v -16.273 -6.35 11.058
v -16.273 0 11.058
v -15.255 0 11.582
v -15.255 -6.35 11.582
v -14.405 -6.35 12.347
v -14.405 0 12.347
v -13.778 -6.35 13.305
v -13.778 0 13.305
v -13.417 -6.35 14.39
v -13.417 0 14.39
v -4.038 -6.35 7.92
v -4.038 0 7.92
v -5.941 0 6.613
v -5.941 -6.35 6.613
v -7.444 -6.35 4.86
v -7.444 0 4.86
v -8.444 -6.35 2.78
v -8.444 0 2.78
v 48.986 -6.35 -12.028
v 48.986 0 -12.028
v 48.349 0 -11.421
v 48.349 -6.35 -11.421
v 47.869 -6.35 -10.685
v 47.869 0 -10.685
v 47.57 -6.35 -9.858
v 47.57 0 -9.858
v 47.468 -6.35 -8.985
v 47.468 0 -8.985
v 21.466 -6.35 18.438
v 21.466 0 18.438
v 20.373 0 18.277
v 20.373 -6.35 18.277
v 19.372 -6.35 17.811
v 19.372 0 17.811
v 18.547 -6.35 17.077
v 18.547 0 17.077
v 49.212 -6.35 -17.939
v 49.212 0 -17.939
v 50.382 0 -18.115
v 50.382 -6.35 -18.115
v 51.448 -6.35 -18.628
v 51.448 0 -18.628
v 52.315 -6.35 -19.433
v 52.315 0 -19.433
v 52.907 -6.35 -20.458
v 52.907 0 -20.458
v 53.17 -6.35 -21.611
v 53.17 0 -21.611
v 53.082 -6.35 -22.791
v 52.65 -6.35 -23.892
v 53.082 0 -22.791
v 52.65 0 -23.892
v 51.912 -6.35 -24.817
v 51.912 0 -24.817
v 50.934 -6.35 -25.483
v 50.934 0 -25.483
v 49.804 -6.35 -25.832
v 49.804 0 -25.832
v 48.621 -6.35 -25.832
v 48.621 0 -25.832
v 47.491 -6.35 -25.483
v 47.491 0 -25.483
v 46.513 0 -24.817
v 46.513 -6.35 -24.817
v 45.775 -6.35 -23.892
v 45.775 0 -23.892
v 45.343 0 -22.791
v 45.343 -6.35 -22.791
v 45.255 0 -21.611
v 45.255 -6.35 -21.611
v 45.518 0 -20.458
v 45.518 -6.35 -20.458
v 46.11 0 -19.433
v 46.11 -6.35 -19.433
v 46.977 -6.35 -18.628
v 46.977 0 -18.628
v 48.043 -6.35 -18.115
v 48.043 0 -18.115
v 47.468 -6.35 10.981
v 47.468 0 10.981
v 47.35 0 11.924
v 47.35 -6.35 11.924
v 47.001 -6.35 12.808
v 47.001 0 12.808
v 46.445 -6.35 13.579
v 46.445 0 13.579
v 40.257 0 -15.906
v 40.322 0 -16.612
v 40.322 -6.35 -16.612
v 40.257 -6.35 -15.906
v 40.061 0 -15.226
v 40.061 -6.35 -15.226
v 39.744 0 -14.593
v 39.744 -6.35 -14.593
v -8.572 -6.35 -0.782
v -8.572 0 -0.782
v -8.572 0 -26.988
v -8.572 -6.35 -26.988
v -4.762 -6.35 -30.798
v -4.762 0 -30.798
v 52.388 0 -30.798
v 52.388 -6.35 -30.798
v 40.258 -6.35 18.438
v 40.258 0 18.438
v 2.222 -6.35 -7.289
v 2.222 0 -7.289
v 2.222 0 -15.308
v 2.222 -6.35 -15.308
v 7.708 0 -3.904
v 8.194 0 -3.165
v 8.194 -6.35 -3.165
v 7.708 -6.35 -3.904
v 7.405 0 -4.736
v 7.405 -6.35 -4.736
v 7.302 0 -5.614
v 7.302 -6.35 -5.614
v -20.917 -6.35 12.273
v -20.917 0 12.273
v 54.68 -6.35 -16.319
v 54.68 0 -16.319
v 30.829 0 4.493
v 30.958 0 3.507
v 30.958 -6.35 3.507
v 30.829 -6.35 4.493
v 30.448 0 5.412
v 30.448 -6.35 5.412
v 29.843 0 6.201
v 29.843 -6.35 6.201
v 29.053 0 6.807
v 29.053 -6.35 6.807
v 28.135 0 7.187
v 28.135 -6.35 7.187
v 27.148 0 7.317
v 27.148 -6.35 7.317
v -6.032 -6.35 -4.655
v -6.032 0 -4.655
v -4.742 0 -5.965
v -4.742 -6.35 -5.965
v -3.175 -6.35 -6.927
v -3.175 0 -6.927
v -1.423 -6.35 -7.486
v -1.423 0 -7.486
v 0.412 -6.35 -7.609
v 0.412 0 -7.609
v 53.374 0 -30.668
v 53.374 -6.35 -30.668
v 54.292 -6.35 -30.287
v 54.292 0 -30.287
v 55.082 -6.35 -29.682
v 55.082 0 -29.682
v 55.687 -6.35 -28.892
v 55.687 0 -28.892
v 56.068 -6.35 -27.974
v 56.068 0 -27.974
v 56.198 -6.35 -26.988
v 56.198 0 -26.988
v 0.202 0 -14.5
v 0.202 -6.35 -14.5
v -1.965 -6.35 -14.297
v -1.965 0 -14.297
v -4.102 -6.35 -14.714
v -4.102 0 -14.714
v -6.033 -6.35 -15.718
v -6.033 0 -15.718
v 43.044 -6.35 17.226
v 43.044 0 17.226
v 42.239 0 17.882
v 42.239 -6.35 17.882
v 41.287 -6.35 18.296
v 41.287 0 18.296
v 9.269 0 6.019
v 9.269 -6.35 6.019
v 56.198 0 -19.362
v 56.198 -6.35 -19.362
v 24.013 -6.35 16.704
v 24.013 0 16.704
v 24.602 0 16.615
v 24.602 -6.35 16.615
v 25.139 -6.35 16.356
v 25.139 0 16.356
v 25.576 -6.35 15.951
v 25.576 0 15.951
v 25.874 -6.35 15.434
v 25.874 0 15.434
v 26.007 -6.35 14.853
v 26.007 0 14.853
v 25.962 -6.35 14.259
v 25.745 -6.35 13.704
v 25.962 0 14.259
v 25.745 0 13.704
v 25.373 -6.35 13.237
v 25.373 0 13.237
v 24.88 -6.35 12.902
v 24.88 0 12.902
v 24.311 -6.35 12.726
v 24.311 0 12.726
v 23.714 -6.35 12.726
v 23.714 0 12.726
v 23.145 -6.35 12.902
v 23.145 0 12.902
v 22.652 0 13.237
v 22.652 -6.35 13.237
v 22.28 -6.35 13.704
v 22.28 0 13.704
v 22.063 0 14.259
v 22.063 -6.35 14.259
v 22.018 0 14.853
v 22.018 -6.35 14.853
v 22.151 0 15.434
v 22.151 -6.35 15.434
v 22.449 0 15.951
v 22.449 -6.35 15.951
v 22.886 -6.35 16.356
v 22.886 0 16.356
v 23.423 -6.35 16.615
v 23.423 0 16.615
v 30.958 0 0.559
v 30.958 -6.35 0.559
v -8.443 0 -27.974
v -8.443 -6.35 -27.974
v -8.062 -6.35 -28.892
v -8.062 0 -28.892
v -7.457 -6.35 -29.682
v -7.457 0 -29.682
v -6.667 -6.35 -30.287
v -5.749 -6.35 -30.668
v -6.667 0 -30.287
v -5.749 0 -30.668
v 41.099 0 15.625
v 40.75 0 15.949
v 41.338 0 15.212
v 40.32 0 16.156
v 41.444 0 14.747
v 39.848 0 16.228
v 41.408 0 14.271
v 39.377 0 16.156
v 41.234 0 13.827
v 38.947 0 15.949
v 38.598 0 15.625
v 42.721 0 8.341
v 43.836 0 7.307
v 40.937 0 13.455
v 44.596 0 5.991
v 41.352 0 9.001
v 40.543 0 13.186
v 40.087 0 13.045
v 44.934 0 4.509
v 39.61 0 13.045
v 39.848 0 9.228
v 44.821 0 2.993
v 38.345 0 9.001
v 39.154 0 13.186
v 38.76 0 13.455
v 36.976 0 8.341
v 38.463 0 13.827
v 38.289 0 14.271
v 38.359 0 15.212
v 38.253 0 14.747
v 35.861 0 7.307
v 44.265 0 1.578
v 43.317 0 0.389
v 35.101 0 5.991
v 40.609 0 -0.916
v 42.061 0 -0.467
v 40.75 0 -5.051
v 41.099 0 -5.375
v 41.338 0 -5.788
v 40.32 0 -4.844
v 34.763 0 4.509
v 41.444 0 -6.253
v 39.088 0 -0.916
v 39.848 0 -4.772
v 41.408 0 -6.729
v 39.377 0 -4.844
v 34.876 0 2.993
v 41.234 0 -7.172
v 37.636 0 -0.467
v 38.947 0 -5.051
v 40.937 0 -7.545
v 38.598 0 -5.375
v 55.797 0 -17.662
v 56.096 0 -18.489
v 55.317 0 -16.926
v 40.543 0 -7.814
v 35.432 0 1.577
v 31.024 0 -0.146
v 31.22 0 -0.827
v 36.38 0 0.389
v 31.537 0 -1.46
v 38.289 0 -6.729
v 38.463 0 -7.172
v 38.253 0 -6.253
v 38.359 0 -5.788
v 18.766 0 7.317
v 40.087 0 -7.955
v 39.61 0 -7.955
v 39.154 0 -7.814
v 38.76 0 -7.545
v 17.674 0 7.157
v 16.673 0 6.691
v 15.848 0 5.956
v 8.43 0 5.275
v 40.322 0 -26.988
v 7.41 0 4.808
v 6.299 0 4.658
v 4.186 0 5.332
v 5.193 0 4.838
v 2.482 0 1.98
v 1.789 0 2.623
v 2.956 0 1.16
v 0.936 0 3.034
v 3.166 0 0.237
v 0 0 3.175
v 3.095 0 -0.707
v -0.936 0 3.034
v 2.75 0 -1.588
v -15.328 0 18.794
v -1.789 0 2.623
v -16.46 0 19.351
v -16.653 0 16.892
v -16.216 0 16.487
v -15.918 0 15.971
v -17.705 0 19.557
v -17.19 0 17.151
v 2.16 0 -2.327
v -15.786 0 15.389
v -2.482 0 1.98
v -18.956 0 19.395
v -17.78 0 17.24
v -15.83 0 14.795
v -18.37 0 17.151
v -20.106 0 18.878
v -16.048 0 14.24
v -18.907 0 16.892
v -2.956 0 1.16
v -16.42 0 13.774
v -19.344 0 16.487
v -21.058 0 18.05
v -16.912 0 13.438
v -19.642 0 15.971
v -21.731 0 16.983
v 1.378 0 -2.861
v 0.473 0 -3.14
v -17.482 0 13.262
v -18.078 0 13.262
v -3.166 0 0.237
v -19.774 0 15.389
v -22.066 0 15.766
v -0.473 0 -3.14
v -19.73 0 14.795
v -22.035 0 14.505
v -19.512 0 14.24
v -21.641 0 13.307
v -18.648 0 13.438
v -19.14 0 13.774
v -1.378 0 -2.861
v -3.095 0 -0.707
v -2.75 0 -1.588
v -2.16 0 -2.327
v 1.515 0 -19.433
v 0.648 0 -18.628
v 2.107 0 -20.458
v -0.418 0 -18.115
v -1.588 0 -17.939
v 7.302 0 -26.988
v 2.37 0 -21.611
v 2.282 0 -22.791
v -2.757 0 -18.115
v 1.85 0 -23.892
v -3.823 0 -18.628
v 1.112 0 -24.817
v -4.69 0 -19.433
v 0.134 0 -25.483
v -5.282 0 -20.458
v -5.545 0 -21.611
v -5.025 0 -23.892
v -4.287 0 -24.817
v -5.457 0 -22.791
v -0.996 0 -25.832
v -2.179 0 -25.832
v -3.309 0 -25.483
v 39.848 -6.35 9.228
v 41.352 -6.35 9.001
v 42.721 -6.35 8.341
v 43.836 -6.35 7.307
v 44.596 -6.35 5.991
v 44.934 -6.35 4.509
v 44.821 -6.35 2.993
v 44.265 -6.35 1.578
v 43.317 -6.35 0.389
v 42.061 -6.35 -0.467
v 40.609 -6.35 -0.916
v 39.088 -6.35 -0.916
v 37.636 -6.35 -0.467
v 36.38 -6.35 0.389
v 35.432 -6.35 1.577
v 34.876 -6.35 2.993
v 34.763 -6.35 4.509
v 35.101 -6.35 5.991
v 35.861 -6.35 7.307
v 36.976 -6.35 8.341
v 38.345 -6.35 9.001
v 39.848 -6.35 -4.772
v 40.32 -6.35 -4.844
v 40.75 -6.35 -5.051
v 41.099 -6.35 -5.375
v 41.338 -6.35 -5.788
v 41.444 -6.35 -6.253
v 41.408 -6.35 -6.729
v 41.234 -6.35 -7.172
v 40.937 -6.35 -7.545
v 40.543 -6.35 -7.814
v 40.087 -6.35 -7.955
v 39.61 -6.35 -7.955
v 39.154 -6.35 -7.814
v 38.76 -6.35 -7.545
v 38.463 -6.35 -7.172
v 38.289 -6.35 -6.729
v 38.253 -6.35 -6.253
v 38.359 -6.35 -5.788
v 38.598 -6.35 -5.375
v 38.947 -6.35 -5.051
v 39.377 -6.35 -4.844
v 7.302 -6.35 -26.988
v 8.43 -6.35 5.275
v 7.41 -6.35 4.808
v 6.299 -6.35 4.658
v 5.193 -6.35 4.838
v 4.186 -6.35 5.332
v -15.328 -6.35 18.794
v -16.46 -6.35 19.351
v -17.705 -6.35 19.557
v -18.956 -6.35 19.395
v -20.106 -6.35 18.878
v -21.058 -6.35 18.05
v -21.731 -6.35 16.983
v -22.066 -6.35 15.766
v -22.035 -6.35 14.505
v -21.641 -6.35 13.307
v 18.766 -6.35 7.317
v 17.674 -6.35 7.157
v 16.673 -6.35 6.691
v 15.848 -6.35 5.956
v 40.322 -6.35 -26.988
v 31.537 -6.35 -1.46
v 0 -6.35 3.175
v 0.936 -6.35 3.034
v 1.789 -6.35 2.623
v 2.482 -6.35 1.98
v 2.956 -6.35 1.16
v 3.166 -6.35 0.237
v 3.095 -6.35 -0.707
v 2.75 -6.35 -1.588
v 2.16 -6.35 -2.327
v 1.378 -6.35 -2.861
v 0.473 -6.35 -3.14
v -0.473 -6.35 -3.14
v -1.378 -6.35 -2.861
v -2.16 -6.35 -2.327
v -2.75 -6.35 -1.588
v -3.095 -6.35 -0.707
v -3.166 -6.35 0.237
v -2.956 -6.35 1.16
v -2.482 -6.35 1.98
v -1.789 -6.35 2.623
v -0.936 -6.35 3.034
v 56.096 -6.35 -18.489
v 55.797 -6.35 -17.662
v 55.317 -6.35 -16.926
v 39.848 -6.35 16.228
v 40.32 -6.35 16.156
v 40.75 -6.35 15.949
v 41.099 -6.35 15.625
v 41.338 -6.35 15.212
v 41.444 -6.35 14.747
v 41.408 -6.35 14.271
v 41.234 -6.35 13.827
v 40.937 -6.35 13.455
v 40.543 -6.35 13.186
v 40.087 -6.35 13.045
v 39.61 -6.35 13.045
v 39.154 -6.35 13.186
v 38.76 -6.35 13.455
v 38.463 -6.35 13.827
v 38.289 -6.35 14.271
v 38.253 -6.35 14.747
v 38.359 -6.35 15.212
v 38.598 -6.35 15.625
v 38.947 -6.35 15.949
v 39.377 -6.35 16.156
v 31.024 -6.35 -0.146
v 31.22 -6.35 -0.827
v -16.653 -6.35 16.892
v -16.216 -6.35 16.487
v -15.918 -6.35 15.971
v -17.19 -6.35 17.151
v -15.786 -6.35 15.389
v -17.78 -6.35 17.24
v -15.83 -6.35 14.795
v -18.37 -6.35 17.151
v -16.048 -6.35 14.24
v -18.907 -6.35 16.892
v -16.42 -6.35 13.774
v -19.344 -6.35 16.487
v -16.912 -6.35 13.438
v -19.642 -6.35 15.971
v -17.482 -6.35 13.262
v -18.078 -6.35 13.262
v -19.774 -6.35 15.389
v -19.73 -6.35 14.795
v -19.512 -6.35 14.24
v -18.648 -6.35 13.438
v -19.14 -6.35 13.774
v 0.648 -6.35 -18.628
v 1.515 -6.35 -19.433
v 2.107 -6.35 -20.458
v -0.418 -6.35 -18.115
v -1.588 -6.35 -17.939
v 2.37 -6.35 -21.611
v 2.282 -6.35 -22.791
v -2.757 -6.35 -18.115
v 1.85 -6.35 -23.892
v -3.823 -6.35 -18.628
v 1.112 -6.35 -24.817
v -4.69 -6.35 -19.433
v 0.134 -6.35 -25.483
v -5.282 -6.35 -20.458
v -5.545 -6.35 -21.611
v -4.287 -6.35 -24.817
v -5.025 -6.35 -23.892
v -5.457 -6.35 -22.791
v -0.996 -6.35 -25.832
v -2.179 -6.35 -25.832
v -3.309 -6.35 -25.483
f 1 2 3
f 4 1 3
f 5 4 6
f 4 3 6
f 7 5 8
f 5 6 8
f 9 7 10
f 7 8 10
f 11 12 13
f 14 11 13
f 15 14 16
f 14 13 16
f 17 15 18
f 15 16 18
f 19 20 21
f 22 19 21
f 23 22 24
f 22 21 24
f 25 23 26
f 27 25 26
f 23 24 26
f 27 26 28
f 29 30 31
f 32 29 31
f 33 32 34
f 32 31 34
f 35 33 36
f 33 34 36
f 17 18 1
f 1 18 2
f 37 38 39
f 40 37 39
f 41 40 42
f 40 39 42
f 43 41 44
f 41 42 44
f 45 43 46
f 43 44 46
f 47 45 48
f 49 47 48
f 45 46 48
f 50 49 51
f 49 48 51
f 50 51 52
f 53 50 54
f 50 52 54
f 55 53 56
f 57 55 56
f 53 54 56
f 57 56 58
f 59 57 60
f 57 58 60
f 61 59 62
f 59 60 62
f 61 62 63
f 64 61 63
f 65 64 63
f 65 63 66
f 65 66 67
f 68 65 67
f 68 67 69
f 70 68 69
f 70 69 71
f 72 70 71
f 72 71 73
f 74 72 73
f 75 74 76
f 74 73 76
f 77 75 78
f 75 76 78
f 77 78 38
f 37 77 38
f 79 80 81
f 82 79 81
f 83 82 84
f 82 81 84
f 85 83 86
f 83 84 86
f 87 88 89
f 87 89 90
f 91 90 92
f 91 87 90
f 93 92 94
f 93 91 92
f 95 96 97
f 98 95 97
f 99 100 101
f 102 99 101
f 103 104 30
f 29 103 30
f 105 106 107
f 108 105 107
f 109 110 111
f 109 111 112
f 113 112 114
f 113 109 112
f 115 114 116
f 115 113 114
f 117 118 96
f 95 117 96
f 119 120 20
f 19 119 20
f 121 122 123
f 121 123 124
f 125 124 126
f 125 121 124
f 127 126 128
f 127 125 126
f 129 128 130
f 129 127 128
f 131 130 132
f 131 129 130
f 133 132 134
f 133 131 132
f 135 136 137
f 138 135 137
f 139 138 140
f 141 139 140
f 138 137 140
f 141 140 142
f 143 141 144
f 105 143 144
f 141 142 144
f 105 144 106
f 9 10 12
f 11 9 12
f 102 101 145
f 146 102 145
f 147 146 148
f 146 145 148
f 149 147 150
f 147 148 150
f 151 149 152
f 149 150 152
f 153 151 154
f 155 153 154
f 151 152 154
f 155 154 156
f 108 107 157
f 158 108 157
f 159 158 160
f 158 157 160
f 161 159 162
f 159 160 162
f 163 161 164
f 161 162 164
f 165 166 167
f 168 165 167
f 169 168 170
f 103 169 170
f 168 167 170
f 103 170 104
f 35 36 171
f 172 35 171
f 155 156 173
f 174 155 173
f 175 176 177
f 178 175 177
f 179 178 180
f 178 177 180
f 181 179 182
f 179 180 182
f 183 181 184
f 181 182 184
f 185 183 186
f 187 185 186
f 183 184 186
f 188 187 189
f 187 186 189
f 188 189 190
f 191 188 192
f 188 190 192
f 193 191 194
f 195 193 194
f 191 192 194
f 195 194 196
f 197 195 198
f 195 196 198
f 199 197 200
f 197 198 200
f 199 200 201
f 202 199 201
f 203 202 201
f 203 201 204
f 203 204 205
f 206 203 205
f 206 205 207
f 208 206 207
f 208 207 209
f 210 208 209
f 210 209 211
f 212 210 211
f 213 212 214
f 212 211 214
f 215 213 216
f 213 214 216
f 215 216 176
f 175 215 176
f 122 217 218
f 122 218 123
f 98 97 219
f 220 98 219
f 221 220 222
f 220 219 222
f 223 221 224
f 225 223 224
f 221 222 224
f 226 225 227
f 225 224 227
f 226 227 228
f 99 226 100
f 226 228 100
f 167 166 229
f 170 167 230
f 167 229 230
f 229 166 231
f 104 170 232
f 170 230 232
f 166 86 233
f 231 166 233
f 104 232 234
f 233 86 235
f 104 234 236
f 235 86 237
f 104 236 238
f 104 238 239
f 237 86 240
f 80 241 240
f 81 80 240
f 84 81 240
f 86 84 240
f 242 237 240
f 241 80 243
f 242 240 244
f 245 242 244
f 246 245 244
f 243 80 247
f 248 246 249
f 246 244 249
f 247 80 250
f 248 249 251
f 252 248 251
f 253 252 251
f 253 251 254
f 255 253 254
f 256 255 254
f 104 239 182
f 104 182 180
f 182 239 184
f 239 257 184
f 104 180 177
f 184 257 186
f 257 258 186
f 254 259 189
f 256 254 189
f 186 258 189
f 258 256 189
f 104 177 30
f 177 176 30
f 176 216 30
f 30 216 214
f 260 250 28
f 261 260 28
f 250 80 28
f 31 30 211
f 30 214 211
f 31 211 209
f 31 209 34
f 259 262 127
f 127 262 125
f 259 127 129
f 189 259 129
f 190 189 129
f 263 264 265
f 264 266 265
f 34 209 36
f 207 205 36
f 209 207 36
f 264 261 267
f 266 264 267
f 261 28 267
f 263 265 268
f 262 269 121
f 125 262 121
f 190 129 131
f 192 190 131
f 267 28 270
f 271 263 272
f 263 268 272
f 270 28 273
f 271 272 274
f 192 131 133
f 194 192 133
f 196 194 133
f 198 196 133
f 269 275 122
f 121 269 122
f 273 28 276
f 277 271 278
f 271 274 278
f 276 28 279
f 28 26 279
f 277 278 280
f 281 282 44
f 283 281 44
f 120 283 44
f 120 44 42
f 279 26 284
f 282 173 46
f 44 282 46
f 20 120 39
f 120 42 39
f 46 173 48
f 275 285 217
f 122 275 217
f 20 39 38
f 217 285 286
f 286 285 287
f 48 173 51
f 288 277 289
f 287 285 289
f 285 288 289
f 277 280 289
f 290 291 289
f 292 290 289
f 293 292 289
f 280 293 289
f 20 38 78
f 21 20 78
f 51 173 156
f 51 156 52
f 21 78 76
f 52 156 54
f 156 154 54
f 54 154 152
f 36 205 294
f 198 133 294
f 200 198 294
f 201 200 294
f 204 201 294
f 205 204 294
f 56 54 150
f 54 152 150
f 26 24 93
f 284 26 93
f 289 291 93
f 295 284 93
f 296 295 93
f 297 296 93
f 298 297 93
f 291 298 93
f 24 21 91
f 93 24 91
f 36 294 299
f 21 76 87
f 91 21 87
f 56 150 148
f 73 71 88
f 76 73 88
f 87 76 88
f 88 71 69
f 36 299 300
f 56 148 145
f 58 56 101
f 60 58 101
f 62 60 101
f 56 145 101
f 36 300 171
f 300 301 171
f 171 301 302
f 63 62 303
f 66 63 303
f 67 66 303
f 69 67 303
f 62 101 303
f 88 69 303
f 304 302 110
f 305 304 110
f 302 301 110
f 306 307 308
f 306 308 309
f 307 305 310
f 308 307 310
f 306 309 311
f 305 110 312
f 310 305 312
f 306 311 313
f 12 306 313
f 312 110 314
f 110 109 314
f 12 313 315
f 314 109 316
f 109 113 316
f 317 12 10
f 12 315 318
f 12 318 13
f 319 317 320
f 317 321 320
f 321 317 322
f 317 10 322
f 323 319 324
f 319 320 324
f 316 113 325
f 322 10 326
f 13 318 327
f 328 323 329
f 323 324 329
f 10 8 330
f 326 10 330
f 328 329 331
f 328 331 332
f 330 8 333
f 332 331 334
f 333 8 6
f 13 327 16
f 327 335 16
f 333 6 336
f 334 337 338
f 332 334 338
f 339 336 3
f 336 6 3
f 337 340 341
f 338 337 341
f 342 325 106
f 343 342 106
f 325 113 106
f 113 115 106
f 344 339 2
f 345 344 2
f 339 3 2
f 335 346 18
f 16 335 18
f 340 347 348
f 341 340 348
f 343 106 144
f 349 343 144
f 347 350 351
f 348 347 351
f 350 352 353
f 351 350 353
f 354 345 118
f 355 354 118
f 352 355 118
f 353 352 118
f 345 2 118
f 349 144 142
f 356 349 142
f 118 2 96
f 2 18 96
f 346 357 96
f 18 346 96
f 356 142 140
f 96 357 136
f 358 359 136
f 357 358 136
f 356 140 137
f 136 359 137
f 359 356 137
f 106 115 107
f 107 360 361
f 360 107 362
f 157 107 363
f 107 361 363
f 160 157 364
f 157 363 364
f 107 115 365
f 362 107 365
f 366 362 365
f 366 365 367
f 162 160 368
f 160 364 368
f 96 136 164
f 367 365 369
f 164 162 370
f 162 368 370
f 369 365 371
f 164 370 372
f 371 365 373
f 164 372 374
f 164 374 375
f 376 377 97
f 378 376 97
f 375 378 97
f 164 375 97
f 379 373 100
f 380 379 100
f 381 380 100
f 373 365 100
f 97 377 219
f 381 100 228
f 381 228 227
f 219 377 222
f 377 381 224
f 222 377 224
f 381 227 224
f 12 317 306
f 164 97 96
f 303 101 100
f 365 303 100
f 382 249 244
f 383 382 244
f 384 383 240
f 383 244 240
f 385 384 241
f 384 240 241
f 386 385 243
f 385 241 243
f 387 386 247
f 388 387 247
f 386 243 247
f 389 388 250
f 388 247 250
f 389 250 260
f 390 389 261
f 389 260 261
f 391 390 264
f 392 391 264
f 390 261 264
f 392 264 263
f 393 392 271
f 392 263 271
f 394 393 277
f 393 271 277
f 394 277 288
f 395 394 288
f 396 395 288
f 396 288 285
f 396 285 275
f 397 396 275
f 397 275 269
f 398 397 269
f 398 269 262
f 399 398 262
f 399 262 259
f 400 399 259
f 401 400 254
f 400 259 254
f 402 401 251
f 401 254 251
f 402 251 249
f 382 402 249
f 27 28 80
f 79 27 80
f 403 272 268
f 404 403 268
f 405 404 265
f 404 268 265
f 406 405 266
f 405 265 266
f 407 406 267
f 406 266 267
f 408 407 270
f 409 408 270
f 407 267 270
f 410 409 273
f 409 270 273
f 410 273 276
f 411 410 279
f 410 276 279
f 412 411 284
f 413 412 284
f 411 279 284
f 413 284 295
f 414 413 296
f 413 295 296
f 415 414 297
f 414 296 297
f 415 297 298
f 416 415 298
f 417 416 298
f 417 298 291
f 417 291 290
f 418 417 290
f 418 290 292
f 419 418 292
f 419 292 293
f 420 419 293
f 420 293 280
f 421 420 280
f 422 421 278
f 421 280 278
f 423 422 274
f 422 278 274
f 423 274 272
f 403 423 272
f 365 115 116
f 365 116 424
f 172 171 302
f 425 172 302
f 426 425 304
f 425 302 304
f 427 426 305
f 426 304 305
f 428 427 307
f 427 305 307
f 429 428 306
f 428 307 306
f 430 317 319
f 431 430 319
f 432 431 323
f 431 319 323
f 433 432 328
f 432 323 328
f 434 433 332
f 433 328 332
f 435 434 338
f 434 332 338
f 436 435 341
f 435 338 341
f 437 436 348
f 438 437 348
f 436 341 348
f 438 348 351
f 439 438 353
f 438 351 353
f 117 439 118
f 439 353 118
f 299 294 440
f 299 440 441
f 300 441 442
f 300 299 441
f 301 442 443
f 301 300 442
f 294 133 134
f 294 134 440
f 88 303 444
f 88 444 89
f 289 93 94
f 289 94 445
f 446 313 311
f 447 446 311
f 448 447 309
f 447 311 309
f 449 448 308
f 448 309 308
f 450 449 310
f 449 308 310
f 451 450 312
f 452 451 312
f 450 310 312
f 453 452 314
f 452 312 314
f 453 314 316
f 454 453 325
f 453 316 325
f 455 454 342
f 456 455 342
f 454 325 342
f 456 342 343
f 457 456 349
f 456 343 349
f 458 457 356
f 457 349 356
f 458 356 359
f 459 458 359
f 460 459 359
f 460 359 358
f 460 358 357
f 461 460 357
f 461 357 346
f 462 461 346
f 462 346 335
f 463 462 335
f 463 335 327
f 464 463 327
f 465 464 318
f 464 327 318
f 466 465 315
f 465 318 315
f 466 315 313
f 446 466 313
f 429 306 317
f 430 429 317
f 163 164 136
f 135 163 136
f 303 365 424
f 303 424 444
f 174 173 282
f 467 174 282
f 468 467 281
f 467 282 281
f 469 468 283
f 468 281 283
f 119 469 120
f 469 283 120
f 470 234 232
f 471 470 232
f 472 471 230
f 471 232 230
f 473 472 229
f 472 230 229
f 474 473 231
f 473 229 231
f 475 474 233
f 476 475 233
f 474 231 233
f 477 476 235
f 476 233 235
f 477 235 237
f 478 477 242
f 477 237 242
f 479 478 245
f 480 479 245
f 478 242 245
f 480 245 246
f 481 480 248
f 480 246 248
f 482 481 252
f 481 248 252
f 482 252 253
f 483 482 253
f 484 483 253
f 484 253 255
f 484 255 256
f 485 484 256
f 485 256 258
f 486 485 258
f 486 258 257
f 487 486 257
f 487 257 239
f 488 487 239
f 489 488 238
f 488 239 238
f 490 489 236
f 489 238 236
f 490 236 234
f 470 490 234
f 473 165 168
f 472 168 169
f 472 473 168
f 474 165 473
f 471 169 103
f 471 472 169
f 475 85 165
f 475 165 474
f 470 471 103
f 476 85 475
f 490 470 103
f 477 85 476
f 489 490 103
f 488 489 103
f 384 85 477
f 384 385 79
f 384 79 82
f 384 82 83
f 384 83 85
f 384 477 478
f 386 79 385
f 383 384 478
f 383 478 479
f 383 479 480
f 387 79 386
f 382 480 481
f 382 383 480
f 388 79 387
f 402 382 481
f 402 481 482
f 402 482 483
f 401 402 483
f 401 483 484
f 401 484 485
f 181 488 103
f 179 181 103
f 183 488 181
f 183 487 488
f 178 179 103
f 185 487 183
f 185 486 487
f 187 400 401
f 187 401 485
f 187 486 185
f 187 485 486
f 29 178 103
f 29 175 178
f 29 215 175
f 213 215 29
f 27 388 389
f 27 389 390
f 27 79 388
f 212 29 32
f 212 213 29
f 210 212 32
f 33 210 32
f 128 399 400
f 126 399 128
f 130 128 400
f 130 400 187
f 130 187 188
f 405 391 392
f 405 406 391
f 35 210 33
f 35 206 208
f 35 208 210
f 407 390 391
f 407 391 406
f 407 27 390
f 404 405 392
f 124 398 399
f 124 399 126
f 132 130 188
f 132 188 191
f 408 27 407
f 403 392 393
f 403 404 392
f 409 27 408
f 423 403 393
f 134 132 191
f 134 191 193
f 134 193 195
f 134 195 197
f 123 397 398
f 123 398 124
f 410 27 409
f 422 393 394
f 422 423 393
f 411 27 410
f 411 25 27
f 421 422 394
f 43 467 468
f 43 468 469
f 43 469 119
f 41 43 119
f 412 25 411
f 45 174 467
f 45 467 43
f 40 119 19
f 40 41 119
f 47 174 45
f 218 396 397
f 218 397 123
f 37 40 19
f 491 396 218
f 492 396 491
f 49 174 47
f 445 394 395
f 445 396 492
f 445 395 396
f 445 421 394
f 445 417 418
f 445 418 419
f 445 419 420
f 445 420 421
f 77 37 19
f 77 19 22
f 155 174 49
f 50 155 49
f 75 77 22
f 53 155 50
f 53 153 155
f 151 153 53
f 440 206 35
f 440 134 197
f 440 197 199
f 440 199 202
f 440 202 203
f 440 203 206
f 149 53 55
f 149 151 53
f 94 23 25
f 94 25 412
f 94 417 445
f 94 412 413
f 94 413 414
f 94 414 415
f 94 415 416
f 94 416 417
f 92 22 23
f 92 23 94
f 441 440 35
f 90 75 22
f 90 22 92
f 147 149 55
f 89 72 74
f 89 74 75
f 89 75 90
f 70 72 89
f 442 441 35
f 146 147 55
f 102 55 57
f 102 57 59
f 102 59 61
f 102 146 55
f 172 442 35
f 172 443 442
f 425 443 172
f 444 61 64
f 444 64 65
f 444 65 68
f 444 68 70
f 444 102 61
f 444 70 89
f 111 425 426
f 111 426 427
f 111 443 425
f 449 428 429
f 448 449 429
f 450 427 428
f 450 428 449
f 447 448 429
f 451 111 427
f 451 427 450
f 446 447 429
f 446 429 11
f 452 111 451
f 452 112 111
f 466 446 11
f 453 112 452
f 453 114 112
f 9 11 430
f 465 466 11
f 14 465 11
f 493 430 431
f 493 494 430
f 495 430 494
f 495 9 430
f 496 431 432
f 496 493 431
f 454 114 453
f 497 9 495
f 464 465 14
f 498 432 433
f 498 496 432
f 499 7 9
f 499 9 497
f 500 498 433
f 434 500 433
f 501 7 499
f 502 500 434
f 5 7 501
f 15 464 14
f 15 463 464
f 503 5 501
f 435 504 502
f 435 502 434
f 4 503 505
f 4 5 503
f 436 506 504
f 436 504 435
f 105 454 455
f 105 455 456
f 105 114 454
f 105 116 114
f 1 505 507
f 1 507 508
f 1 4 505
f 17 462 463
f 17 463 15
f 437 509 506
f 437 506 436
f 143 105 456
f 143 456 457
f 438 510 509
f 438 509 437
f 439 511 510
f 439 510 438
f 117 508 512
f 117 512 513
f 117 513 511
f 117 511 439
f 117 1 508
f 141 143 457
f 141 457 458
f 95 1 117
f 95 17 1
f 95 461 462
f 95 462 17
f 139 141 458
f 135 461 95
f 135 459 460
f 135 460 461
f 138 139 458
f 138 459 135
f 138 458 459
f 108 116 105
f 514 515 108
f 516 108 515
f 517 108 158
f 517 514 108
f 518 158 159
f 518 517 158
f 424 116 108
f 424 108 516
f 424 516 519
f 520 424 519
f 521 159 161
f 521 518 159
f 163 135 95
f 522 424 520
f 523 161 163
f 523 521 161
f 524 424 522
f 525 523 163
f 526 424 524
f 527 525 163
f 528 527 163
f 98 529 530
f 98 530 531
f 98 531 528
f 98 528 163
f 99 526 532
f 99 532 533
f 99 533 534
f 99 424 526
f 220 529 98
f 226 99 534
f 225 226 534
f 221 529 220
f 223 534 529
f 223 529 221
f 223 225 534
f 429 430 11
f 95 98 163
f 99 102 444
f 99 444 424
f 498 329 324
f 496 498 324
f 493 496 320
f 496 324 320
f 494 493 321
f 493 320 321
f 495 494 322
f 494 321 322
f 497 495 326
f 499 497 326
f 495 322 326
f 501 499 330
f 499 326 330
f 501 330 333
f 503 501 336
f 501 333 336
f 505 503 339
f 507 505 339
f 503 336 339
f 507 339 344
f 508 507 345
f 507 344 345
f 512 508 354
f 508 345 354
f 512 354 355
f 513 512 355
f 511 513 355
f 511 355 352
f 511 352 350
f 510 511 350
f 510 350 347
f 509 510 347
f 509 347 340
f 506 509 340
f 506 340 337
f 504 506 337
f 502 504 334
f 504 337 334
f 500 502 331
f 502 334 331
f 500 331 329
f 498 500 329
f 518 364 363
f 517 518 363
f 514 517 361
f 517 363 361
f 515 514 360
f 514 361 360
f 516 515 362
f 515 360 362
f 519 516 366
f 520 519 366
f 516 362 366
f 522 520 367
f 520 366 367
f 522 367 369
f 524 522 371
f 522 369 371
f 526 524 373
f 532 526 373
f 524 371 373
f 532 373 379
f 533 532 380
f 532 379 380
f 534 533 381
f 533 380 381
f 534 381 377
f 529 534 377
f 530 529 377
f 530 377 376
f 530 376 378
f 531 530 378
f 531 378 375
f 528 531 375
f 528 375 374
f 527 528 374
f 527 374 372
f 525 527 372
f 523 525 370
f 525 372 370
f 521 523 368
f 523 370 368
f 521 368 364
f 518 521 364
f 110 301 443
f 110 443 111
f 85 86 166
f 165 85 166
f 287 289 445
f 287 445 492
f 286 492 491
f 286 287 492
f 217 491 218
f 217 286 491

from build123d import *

# Parameters (mm, degrees)
SKETCH4_R           = 3.175
SKETCH4_R_2         = 3.96875
SKETCH4_R_3         = 5.1
SKETCH4_R_4         = 1.6
SKETCH4_R_5         = 2
BOSS_EXTRUDE2_DEPTH = 6.35


with BuildPart() as part:
    # Sketch4 → Boss-Extrude2 (new body)
    with BuildSketch(Plane(origin=(0, 0, 0), x_dir=(1, 0, 0), z_dir=(0, 1, 0))):
        with BuildLine():
            Line((40.257702493, -18.4375), (21.46596982, -18.4375))
            ThreePointArc((21.46596982, -18.4375), (19.855794242, -18.080532669), (18.547340491, -17.076520793))
            Line((18.547340491, -17.076520793), (9.268629328, -6.01858343))
            ThreePointArc((9.268629328, -6.01858343), (6.86044471, -4.691952465), (4.186444468, -5.331503545))
            Line((4.186444468, -5.331503545), (-15.327970397, -18.794247435))
            ThreePointArc((-15.327970397, -18.794247435), (-21.058470009, -18.050117151), (-20.917416467, -12.27322702))
            Line((-20.917416467, -12.27322702), (-8.5725, 0.781747009))
            Line((-8.5725, 0.781747009), (-8.5725, 26.9875))
            ThreePointArc((-8.5725, 26.9875), (-7.456576836, 29.681576836), (-4.7625, 30.7975))
            Line((-4.7625, 30.7975), (52.3875, 30.7975))
            ThreePointArc((52.3875, 30.7975), (55.081576836, 29.681576836), (56.1975, 26.9875))
            Line((56.1975, 26.9875), (56.1975, 19.362095927))
            ThreePointArc((56.1975, 19.362095927), (55.797199918, 17.662082259), (54.680415238, 16.319294633))
            Line((54.680415238, 16.319294633), (48.985566477, 12.027918285))
            ThreePointArc((48.985566477, 12.027918285), (47.868781798, 10.685130659), (47.468481715, 8.985116992))
            Line((47.468481715, 8.985116992), (47.468481715, -10.980610773))
            ThreePointArc((47.468481715, -10.980610773), (47.203372649, -12.376980446), (46.444939319, -13.579024524))
            Line((46.444939319, -13.579024524), (43.044160097, -17.225913752))
            ThreePointArc((43.044160097, -17.225913752), (41.776936446, -18.121498883), (40.257702493, -18.4375))
        make_face()
        with Locations(Location((0, 0, 0), (0, 0, 270))):
            Circle(SKETCH4_R, mode=Mode.SUBTRACT)
        with Locations(Location((-1.5875, 21.9075, 0), (0, 0, 270))):
            Circle(SKETCH4_R_2, mode=Mode.SUBTRACT)
        with Locations(Location((49.2125, 21.9075, 0), (0, 0, 270))):
            Circle(SKETCH4_R_2, mode=Mode.SUBTRACT)
        with Locations(Location((39.848481715, -4.1275, 0), (0, 0, 270))):
            Circle(SKETCH4_R_3, mode=Mode.SUBTRACT)
        with Locations(Location((39.848481715, -14.6275, 0), (0, 0, 270))):
            Circle(SKETCH4_R_4, mode=Mode.SUBTRACT)
        with Locations(Location((39.848481715, 6.3725, 0), (0, 0, 270))):
            Circle(SKETCH4_R_4, mode=Mode.SUBTRACT)
        with Locations(Location((24.012521227, -14.703599027, 0), (0, 0, 270))):
            Circle(SKETCH4_R_5, mode=Mode.SUBTRACT)
        with Locations(Location((-17.78, -15.24, 0), (0, 0, 270))):
            Circle(SKETCH4_R_5, mode=Mode.SUBTRACT)
        with BuildLine():
            Line((40.3225, 26.9875), (40.3225, 16.611657969))
            ThreePointArc((40.3225, 16.611657969), (40.174907062, 15.561479644), (39.743563246, 14.592665573))
            Line((39.743563246, 14.592665573), (31.537418469, 1.460088735))
            ThreePointArc((31.537418469, 1.460088735), (31.106074654, 0.491274664), (30.958481715, -0.558903662))
            Line((30.958481715, -0.558903662), (30.958481715, -3.507298313))
            ThreePointArc((30.958481715, -3.507298313), (29.842558552, -6.20137515), (27.148481715, -7.317298313))
            Line((27.148481715, -7.317298313), (18.766481715, -7.317298313))
            ThreePointArc((18.766481715, -7.317298313), (17.156306138, -6.960330982), (15.847852387, -5.956319106))
            Line((15.847852387, -5.956319106), (8.193870672, 3.165341101))
            ThreePointArc((8.193870672, 3.165341101), (7.532271115, 4.311265148), (7.3025, 5.614361894))
            Line((7.3025, 5.614361894), (7.3025, 26.9875))
            Line((7.3025, 26.9875), (40.3225, 26.9875))
        make_face(mode=Mode.SUBTRACT)
        with BuildLine():
            Line((-13.417009712, -14.390093684), (-4.038317295, -7.919854381))
            ThreePointArc((-4.038317295, -7.919854381), (-6.749791195, -5.78553531), (-8.444304622, -2.779535833))
            Line((-8.444304622, -2.779535833), (-16.272811714, -11.058324681))
            ThreePointArc((-16.272811714, -11.058324681), (-14.405104402, -12.347232345), (-13.417009712, -14.390093684))
        make_face(mode=Mode.SUBTRACT)
        with BuildLine():
            Line((2.2225, 7.28868258), (2.2225, 15.308386423))
            ThreePointArc((2.2225, 15.308386423), (-1.965402874, 14.296876542), (-6.0325, 15.718285591))
            Line((-6.0325, 15.718285591), (-6.0325, 4.65546386))
            ThreePointArc((-6.0325, 4.65546386), (-2.315704041, 7.259608446), (2.2225, 7.28868258))
        make_face(mode=Mode.SUBTRACT)
    extrude(amount=-BOSS_EXTRUDE2_DEPTH)


solid = part.part
